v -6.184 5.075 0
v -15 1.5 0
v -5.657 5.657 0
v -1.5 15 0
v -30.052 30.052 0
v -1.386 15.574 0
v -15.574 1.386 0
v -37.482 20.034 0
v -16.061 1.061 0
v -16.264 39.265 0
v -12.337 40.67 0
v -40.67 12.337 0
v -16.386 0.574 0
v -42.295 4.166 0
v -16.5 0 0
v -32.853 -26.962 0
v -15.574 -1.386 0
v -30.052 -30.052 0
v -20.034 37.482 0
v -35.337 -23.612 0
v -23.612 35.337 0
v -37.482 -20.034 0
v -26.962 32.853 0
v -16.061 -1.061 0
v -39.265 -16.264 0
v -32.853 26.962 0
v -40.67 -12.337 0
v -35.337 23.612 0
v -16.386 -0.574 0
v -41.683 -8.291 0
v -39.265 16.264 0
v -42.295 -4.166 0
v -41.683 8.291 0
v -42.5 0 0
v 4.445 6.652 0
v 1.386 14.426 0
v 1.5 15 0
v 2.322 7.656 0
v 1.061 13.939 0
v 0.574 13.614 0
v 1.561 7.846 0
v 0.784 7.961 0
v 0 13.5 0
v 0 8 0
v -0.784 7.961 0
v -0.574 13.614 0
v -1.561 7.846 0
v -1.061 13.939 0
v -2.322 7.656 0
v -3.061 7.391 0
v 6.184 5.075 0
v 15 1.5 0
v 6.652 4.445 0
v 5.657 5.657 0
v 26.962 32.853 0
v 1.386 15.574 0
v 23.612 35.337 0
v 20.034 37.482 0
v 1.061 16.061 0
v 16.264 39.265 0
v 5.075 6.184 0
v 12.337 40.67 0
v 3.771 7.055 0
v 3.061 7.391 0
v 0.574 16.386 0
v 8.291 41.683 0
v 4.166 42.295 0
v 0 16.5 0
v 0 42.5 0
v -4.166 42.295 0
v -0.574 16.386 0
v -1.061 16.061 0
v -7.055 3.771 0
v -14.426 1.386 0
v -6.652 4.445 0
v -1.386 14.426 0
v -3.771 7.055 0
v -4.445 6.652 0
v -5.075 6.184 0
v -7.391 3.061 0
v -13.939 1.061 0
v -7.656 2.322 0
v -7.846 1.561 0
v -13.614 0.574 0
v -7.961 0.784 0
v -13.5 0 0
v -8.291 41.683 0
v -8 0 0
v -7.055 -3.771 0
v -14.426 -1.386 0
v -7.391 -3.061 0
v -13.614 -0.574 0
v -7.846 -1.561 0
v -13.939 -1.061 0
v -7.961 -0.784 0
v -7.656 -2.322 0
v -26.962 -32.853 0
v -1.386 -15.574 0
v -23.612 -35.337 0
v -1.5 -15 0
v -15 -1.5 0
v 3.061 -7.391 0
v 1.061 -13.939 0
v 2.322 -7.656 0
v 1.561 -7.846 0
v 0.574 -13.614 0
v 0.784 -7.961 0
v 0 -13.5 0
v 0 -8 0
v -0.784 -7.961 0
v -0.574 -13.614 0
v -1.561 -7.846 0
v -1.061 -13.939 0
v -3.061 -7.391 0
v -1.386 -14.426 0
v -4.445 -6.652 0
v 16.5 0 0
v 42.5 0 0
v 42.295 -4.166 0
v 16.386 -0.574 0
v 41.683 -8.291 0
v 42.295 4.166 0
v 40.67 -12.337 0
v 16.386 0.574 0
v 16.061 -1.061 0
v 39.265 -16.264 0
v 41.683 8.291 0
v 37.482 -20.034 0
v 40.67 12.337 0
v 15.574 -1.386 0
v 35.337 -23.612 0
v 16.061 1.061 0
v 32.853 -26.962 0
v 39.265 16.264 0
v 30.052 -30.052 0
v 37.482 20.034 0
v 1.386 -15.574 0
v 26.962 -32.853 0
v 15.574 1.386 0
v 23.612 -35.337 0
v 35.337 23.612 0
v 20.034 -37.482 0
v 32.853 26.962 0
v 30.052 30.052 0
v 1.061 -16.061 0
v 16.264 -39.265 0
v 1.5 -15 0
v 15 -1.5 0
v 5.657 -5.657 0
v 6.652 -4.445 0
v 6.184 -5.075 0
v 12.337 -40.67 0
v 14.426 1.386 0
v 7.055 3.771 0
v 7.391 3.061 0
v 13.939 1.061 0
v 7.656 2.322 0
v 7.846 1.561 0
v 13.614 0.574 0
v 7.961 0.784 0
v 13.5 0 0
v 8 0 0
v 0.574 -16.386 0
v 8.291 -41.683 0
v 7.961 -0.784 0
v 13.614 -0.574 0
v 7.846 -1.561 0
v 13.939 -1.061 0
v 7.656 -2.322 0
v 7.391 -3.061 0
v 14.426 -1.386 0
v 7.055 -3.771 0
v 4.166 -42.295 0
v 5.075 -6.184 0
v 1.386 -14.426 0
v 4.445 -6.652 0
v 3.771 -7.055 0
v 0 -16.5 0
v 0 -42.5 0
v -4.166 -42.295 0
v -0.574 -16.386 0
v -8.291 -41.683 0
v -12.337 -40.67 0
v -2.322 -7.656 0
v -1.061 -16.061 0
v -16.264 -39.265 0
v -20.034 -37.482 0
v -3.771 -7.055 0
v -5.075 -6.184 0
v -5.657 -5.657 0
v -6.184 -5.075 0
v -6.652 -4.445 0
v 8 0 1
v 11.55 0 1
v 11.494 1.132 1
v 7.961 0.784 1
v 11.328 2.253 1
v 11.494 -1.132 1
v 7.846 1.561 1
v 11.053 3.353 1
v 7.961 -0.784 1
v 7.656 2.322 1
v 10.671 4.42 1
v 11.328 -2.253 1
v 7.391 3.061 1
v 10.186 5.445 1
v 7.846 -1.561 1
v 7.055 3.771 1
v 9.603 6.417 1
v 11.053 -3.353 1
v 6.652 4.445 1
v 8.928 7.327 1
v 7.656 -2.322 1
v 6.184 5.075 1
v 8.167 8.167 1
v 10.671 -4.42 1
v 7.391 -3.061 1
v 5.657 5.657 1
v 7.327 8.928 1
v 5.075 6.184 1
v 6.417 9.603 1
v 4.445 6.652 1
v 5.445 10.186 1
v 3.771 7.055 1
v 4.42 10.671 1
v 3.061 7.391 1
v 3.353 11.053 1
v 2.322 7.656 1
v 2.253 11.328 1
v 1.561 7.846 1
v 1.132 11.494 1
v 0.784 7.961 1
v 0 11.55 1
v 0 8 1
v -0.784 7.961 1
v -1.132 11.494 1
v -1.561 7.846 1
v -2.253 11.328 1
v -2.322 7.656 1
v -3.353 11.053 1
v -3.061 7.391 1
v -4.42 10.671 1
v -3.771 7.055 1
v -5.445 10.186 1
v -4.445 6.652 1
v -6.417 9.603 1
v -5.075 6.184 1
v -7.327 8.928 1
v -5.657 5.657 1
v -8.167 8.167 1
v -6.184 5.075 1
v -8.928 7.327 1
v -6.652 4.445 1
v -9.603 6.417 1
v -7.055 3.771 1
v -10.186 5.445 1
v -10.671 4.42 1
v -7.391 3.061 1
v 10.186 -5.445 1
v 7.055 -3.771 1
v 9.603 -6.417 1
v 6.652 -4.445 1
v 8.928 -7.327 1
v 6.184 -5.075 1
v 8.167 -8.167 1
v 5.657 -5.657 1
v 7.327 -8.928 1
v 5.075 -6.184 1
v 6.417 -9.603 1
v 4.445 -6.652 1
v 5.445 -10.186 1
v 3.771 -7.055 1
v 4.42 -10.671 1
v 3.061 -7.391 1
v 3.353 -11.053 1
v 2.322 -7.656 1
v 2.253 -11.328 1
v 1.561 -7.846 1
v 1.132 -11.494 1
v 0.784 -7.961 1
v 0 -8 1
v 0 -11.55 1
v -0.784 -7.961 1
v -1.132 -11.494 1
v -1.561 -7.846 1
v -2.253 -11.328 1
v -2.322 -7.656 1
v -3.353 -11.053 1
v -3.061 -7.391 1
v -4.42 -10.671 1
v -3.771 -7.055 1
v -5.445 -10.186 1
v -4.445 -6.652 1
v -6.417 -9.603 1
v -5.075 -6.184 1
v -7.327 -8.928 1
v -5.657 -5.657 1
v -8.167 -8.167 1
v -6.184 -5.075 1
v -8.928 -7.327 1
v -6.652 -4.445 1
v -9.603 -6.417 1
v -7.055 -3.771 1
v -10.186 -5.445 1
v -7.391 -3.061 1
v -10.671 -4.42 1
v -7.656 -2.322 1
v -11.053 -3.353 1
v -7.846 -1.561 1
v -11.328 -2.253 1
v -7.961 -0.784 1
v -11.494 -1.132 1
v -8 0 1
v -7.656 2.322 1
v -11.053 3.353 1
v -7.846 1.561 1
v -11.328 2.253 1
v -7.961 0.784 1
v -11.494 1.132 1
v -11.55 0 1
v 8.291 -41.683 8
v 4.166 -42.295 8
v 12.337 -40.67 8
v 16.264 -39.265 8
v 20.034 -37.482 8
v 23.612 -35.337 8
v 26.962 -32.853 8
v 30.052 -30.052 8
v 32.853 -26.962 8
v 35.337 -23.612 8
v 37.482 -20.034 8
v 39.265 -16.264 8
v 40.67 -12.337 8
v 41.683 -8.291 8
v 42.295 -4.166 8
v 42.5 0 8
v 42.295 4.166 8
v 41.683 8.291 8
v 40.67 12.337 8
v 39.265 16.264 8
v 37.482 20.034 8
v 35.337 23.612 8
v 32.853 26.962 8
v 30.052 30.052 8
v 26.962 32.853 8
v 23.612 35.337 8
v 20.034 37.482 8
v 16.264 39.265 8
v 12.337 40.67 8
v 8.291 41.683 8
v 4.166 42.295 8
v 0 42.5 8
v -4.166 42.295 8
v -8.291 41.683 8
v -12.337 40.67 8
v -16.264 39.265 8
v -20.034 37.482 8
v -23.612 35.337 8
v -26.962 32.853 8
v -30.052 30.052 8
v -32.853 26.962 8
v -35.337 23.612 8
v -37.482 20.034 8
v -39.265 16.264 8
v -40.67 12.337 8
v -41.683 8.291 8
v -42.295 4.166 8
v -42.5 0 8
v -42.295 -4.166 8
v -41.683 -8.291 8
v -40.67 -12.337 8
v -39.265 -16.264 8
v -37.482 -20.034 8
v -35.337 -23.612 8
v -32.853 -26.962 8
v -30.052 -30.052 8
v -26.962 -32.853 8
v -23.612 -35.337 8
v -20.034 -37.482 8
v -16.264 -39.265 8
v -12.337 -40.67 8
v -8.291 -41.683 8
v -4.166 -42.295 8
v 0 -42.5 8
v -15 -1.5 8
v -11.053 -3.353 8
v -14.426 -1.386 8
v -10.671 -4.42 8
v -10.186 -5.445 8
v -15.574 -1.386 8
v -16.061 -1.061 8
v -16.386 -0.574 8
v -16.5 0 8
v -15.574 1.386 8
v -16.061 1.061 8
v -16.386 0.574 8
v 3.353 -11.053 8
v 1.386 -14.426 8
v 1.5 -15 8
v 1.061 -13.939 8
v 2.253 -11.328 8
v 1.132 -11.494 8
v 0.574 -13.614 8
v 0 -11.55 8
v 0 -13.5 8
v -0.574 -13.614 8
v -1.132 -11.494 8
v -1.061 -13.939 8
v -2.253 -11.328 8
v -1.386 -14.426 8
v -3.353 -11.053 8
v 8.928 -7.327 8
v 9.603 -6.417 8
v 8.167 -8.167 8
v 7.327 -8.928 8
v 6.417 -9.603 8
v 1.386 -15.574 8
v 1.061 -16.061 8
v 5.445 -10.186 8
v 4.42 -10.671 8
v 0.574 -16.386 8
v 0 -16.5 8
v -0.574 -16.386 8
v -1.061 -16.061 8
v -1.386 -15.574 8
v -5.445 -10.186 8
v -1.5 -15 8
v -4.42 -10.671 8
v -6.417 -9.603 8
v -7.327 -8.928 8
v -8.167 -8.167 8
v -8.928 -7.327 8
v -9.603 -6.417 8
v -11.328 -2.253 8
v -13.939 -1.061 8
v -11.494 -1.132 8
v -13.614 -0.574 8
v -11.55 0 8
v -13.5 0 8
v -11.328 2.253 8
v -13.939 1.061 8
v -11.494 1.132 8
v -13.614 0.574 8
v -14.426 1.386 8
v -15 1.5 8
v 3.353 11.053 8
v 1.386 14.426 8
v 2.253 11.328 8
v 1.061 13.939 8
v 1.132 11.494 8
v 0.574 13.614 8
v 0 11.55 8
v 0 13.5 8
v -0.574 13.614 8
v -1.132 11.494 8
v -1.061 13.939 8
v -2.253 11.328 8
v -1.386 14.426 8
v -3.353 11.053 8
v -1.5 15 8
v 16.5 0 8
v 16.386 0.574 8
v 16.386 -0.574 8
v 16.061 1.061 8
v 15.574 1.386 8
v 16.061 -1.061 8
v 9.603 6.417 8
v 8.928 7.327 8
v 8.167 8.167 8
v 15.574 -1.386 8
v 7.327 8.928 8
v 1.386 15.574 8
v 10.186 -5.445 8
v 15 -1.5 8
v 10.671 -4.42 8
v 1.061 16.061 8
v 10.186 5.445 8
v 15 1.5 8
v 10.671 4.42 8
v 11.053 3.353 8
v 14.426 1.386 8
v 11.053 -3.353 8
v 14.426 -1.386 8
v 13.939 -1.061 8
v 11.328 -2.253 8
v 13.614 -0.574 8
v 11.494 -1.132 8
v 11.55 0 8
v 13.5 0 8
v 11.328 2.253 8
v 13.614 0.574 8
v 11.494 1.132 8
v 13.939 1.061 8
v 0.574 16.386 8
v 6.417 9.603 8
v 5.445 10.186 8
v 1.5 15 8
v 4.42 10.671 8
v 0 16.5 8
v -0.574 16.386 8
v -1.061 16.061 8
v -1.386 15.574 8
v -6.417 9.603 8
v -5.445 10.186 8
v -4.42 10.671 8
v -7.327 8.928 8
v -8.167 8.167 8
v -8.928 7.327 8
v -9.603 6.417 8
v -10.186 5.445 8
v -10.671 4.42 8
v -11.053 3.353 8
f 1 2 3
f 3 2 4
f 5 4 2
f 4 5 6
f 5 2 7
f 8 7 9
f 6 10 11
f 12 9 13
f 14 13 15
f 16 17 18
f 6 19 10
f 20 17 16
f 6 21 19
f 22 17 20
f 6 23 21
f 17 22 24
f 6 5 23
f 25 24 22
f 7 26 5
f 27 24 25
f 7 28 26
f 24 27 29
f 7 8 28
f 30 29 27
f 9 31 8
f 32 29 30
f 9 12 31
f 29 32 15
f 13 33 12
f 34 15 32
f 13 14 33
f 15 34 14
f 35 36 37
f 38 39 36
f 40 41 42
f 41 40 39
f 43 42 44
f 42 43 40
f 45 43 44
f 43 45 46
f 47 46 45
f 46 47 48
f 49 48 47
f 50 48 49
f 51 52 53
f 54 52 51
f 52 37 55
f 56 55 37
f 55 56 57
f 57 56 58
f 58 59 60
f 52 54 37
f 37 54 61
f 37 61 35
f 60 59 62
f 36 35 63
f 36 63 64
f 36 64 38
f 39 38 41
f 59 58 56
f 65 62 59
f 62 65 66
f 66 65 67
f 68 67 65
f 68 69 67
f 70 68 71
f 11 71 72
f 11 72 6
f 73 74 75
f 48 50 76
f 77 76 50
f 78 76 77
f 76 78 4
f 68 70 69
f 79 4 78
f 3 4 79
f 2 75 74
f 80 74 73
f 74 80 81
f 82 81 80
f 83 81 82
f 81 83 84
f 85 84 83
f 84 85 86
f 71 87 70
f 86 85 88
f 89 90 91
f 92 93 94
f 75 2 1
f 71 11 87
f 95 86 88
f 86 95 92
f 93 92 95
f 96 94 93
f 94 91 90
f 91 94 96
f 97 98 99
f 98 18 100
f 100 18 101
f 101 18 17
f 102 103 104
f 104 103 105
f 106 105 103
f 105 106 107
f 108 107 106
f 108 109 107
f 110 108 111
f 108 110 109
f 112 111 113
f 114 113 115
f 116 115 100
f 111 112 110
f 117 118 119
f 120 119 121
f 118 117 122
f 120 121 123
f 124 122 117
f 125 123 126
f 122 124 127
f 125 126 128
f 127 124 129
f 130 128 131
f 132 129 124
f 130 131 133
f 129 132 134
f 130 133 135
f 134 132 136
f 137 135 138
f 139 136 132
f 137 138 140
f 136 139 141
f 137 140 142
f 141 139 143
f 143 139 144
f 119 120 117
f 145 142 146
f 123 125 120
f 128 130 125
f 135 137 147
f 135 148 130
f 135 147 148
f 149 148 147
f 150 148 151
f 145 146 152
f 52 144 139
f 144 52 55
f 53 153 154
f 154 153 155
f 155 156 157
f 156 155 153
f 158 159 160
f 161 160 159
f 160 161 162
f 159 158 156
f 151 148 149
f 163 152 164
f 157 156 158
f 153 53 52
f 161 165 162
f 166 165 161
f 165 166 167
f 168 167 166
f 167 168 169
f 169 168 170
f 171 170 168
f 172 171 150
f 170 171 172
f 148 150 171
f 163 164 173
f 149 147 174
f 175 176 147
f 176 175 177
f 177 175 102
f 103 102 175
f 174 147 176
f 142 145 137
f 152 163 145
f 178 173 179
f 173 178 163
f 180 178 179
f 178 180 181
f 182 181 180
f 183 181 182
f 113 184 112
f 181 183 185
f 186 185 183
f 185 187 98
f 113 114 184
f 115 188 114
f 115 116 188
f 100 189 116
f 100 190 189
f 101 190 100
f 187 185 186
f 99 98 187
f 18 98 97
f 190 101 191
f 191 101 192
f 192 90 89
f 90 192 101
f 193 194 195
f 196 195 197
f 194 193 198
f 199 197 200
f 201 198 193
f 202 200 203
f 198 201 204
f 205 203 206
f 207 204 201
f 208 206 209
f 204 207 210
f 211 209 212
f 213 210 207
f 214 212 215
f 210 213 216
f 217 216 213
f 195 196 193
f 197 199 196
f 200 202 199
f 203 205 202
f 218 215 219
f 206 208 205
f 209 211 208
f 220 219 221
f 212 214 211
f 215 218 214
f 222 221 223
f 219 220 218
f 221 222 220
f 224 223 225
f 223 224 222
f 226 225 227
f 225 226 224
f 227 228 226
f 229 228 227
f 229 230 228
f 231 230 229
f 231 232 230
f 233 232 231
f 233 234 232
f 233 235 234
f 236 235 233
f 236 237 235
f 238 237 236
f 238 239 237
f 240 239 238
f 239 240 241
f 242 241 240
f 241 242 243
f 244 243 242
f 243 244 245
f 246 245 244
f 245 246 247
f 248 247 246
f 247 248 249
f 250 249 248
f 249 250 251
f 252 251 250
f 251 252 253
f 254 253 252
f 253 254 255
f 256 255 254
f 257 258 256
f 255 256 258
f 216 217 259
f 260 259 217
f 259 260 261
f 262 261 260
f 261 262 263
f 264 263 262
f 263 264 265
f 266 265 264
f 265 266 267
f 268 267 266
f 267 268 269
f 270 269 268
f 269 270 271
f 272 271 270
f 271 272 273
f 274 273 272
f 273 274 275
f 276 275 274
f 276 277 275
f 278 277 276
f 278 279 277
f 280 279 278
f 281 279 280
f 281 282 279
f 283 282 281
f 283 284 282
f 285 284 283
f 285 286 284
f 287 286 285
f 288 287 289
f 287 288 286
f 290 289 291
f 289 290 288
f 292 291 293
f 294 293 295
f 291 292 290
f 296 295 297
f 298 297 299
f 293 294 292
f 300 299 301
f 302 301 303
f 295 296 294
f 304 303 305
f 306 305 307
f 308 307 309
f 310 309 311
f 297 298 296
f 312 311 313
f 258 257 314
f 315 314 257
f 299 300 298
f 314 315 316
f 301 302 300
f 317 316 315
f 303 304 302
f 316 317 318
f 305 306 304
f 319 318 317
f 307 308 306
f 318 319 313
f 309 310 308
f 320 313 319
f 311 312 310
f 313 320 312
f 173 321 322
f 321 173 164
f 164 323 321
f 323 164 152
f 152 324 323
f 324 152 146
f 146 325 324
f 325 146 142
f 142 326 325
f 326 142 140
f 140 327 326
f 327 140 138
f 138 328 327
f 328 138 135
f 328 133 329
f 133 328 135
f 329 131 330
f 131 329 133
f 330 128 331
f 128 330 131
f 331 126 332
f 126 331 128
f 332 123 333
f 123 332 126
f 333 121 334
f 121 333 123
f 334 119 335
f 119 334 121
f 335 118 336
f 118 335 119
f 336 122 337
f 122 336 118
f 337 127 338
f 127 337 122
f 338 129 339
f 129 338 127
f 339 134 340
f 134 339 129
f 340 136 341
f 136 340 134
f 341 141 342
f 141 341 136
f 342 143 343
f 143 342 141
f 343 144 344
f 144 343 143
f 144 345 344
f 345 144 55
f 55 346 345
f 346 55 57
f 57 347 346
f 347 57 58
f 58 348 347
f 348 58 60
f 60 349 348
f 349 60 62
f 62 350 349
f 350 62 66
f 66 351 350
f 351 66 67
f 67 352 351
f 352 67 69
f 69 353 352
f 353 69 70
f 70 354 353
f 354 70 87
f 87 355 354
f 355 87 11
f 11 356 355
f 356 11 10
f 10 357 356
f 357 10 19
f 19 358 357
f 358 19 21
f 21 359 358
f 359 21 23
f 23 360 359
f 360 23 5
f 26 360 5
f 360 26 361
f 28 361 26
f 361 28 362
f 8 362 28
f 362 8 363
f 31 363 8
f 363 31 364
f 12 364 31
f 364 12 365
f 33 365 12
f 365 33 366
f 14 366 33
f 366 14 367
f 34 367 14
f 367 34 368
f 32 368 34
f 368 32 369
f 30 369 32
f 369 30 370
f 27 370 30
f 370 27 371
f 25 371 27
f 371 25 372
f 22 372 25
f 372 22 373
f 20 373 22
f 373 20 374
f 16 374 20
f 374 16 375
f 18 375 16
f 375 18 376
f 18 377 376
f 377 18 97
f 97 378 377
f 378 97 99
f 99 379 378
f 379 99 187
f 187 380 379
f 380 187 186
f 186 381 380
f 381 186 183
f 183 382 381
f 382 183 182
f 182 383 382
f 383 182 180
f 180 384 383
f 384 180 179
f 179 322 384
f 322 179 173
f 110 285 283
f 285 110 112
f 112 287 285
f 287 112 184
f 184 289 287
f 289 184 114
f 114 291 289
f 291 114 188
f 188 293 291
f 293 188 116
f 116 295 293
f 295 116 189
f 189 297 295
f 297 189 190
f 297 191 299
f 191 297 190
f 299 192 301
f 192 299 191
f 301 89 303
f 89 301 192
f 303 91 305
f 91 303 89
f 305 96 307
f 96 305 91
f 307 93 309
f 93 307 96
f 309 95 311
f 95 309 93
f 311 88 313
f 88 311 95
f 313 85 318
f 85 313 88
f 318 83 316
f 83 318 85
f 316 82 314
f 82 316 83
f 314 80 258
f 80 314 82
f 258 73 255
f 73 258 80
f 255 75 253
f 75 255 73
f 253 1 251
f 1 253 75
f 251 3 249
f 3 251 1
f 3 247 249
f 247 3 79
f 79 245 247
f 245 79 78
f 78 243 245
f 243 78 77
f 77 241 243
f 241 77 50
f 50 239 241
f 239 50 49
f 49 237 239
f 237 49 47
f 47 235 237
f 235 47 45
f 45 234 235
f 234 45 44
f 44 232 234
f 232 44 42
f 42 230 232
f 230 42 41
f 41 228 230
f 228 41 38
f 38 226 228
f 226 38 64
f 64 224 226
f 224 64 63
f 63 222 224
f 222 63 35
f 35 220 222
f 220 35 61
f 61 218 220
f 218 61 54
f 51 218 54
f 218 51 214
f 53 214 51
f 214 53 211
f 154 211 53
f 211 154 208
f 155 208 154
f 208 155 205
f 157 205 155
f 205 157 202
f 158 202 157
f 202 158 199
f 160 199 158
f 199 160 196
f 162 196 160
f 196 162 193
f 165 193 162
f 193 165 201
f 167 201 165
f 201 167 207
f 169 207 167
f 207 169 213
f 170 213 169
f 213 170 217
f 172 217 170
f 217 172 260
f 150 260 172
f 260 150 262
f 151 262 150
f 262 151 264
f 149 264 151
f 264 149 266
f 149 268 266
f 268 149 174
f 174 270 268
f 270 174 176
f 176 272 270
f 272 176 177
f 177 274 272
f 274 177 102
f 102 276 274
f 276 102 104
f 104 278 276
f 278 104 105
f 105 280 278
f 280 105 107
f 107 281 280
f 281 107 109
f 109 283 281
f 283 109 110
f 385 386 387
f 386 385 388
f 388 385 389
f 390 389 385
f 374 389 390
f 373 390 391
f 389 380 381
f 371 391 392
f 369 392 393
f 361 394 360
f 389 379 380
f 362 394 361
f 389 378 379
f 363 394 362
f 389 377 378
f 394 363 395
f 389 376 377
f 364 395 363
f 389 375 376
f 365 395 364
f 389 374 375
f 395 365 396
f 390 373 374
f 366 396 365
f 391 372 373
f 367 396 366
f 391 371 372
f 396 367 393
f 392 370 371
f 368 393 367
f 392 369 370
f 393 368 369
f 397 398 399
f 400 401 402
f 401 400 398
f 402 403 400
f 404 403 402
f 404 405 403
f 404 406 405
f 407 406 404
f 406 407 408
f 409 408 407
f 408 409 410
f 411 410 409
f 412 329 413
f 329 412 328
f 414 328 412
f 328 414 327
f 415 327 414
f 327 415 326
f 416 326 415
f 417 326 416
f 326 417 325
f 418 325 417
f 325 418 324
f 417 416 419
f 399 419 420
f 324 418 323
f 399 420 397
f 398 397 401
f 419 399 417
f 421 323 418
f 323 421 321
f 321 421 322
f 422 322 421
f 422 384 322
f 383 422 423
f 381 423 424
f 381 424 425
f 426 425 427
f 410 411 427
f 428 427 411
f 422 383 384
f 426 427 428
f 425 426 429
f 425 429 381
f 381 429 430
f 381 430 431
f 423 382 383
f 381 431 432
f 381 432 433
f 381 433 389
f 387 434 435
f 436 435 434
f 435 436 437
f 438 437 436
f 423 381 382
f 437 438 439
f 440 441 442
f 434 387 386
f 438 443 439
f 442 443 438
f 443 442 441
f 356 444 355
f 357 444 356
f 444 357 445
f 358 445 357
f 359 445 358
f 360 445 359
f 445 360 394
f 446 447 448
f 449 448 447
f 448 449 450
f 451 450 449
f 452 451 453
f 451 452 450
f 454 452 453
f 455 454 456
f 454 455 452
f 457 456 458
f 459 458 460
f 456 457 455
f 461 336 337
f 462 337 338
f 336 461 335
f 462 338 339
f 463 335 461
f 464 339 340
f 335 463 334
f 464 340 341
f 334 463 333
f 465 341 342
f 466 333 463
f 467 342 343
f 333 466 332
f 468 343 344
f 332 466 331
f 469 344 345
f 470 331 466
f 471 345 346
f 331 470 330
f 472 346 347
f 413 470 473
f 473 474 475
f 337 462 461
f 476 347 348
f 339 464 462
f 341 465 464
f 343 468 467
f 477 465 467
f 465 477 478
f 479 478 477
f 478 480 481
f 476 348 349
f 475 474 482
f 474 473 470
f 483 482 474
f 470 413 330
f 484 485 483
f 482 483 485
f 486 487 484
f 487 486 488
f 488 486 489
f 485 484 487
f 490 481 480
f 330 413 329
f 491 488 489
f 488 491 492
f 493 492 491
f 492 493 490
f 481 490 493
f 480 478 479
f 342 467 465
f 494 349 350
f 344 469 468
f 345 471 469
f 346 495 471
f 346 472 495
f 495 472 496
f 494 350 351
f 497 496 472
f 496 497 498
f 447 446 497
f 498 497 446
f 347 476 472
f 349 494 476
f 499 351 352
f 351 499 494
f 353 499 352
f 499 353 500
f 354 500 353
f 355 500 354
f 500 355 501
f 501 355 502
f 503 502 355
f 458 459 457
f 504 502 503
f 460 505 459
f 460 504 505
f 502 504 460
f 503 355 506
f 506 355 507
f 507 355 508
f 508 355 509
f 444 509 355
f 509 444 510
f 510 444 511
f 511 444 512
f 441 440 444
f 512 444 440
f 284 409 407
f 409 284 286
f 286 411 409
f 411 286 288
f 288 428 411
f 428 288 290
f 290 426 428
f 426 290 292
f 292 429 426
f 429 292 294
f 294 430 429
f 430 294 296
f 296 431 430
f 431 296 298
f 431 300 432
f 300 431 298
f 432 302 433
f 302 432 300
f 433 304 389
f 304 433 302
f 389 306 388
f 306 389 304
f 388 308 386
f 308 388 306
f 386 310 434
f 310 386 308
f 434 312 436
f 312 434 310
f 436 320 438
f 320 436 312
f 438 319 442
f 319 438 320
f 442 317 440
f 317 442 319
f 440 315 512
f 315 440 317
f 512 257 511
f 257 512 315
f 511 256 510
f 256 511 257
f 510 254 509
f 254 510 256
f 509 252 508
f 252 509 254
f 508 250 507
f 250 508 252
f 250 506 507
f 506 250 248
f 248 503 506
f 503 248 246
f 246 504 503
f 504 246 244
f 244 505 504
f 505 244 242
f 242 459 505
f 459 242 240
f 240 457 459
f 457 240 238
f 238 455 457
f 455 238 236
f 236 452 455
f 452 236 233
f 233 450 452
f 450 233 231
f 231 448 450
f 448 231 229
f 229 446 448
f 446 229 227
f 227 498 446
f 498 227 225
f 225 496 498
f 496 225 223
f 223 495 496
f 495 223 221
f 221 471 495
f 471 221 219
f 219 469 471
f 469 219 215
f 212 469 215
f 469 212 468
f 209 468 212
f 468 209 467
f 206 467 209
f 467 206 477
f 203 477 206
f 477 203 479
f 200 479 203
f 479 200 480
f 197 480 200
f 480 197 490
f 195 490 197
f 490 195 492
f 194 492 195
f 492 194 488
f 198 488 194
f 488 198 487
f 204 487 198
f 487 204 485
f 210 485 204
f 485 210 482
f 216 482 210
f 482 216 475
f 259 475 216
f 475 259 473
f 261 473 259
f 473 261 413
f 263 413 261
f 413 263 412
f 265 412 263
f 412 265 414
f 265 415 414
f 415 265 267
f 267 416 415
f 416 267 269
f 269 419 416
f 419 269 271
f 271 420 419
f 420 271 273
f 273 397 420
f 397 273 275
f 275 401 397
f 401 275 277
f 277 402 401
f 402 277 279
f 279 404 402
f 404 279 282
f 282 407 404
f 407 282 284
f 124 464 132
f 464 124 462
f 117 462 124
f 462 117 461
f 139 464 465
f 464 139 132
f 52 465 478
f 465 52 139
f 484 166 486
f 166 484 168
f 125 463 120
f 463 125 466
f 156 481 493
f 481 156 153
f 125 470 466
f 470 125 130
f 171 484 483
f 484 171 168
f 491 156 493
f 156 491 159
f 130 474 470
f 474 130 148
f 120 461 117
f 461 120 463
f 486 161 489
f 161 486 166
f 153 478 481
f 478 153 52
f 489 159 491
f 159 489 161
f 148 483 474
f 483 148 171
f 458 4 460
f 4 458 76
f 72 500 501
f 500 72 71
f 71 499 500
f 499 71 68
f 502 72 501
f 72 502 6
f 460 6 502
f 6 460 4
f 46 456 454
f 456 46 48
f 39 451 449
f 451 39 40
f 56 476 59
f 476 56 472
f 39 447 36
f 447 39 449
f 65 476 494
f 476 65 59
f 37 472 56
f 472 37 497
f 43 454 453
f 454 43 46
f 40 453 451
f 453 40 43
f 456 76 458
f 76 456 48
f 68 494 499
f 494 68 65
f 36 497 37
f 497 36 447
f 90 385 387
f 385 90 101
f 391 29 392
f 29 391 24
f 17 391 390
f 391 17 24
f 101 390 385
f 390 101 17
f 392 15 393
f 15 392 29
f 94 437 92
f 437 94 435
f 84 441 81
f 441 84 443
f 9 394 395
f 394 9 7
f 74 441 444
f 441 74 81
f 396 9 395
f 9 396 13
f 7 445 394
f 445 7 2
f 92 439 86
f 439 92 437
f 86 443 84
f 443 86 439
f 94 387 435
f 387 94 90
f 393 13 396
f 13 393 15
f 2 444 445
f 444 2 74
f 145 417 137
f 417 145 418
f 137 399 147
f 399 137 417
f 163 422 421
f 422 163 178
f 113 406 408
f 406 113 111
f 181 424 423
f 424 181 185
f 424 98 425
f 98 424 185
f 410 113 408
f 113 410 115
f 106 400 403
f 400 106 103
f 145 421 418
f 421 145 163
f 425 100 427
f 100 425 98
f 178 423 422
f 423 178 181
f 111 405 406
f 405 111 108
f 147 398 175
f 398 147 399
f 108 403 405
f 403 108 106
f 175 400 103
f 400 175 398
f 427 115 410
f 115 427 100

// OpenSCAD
$fn=64; 
E=0.01;

wheel_od = 85;
bearing_od = 22 * 1.05;
bearing_od_margin = 16; // diameter we can do a flange without hitting nuts
bearing_width = 7;
wheel_width = 8;
screw_dia = 3;
screw_head_dia = 6;
sprocket_teeth = 64;
screw_offset = 15;

part1=1;
part2=0;

module washer(od,id,h) {
    linear_extrude(h) difference() {
        circle(d=od);
        circle(d=id);
    }
}

if (part1) difference() {
    union() {
        h = wheel_width-bearing_width;
        translate([0,0,0]) washer(od=wheel_od,id=bearing_od_margin,h=h);
        translate([0,0,h]) washer(od=wheel_od,id=bearing_od,h=bearing_width);
    }
    for (theta = [0:90:360-1]) {
        rotate([0,0,theta]) translate([screw_offset,0,-E]) cylinder(d=screw_dia,h=30,$fn=16);
    }
}    
//color([1,0,0,0.5]) translate([0,0,8]) washer(od=85,id=16,h=1);

if (part2) color([0,1,1,0.5]) translate([0,0,8]) {
    difference() {
        union() {
            gt2_sprocket(sprocket_teeth,7);
            d1 = 36/60 * sprocket_teeth; // experimentally derived due to laziness
            translate([0,0,7-0.6]) cylinder(d1=d1,d2=d1+4,h=1.6);
        }
        translate([0,0,-E]) cylinder(d=bearing_od_margin,h=20);
        for (theta = [0:90:360-1]) {
            rotate([0,0,theta]) translate([screw_offset,0,7-3]) cylinder(d=screw_head_dia,h=10,$fn=16);
            rotate([0,0,theta]) translate([screw_offset,0,-E]) cylinder(d=screw_dia,h=10,$fn=16);
        }
    }
}

module gt2_sprocket(number_of_teeth=36,height=7) {
    toothed_part_length = height;
    base_height=0;
    additional_tooth_width = 0.2; //mm
    additional_tooth_depth = 0; //mm
    tooth_width =  1.494 ;
    tooth_depth = 0.764;

    GT2_2mm_pulley_dia = tooth_spacing (2,0.254);
    pulley_OD = GT2_2mm_pulley_dia;


    function tooth_spaceing_curvefit (b,c,d)
        = ((c * pow(number_of_teeth,d)) / (b + pow(number_of_teeth,d))) * number_of_teeth ;

    function tooth_spacing(tooth_pitch,pitch_line_offset)
        = (2*((number_of_teeth*tooth_pitch)/(3.14159265*2)-pitch_line_offset)) ;


    tooth_distance_from_centre = sqrt( pow(pulley_OD/2,2) - pow((tooth_width+additional_tooth_width)/2,2));
        tooth_width_scale = (tooth_width + additional_tooth_width ) / tooth_width;
        tooth_depth_scale = ((tooth_depth + additional_tooth_depth ) / tooth_depth) ;


    difference() {
        //shaft - diameter is outside diameter of pulley
        
        translate([0,0,base_height]) 
        rotate ([0,0,360/(number_of_teeth*4)]) 
        cylinder(r=pulley_OD/2,h=toothed_part_length, $fn=number_of_teeth*4);

        //teeth - cut out of shaft

        for(i=[1:number_of_teeth]) 
        rotate([0,0,i*(360/number_of_teeth)])
        translate([0,-tooth_distance_from_centre,base_height -1]) 
        scale ([ tooth_width_scale , tooth_depth_scale , 1 ]) {
            GT2_2mm(toothed_part_length);
        }

    }
}

module GT2_2mm(h) {
	linear_extrude(height=h+2) polygon([[0.747183,-0.5],[0.747183,0],[0.647876,0.037218],[0.598311,0.130528],[0.578556,0.238423],[0.547158,0.343077],[0.504649,0.443762],[0.451556,0.53975],[0.358229,0.636924],[0.2484,0.707276],[0.127259,0.750044],[0,0.76447],[-0.127259,0.750044],[-0.2484,0.707276],[-0.358229,0.636924],[-0.451556,0.53975],[-0.504797,0.443762],[-0.547291,0.343077],[-0.578605,0.238423],[-0.598311,0.130528],[-0.648009,0.037218],[-0.747183,0],[-0.747183,-0.5]]);
}
